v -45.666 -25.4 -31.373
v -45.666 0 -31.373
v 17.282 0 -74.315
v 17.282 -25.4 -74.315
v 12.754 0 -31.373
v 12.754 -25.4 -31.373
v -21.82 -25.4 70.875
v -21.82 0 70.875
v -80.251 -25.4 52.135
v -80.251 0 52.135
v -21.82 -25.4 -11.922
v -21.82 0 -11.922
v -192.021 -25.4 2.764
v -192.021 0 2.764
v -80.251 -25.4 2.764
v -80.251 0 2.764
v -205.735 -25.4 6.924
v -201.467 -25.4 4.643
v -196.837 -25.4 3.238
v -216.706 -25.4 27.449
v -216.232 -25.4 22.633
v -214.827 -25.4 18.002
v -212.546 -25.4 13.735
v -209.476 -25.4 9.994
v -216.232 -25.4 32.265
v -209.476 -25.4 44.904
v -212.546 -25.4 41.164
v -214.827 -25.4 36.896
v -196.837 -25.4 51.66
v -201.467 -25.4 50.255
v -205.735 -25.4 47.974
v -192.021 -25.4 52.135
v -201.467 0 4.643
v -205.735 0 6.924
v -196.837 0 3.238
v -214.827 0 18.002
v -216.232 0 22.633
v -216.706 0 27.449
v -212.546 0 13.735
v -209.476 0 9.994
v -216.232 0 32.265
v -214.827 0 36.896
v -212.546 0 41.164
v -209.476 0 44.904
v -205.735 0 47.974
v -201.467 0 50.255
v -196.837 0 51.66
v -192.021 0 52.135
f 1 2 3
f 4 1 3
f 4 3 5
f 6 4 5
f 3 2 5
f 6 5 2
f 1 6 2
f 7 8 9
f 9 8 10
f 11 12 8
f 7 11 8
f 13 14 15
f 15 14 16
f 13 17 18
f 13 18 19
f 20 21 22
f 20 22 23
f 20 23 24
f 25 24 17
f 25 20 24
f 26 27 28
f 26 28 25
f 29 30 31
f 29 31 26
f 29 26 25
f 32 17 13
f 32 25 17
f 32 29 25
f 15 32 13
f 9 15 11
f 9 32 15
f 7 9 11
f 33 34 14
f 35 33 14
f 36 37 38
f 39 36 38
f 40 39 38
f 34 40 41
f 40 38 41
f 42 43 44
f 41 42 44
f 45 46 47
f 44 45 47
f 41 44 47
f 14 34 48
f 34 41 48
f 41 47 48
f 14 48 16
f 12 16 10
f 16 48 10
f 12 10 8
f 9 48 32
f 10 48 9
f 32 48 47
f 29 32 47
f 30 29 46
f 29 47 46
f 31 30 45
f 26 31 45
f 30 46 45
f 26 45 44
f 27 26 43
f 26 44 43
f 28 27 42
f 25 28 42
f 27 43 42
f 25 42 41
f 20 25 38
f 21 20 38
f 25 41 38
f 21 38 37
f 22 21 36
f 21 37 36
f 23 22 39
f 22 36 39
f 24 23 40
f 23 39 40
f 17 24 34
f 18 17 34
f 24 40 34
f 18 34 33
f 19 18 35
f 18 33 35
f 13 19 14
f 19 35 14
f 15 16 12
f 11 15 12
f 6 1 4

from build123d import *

# Parameters (mm, degrees)
F0_W     = 111.7699816823
F0_H     = 49.370786408
F1_DEPTH = 25.4
F2_DEPTH = 25.4
F4_DEPTH = 25.4


# Not quite as in the source:
# - the program builds the solid bodies; features that only make, move or delete a surface that nothing else refers to are left out


with BuildPart() as f1:
    # F0 (on Front) → F1 (new body)
    with BuildSketch(Plane.XZ):
        with Locations((-136.135738343, 27.4491094751)):
            Rectangle(F0_W, F0_H)
        with BuildLine():
            Line((-192.0207291842, 2.7637162711), (-192.0207291842, 52.1345026791))
            ThreePointArc((-192.0207291842, 52.1345026791), (-216.7061223881, 27.4491094751), (-192.0207291842, 2.7637162711))
        make_face()
        Polygon((-21.8198485672, 70.8749219775), (-80.2507475019, 52.1345026791), (-80.2507475019, 2.7637162711), (-21.8198485672, -11.922063306), align=None)
    extrude(amount=F1_DEPTH)

    # F0 (on Front) → F2 (join)
    with BuildSketch(Plane.XZ):
        with Locations((-136.135738343, 27.4491094751)):
            Rectangle(F0_W, F0_H)
        with BuildLine():
            Line((-192.0207291842, 2.7637162711), (-192.0207291842, 52.1345026791))
            ThreePointArc((-192.0207291842, 52.1345026791), (-216.7061223881, 27.4491094751), (-192.0207291842, 2.7637162711))
        make_face()
        Polygon((-21.8198485672, 70.8749219775), (-80.2507475019, 52.1345026791), (-80.2507475019, 2.7637162711), (-21.8198485672, -11.922063306), align=None)
    extrude(amount=F2_DEPTH)


with BuildPart() as f4:
    # F3 (on Front) → F4 (new body)
    with BuildSketch(Plane.XZ):
        Polygon((12.7544817491, -31.3732413198), (-45.6655182509, -31.3732413198), (17.282307836, -74.3151927301), align=None)
    extrude(amount=F4_DEPTH)


solid = Compound([f1.part, f4.part])
